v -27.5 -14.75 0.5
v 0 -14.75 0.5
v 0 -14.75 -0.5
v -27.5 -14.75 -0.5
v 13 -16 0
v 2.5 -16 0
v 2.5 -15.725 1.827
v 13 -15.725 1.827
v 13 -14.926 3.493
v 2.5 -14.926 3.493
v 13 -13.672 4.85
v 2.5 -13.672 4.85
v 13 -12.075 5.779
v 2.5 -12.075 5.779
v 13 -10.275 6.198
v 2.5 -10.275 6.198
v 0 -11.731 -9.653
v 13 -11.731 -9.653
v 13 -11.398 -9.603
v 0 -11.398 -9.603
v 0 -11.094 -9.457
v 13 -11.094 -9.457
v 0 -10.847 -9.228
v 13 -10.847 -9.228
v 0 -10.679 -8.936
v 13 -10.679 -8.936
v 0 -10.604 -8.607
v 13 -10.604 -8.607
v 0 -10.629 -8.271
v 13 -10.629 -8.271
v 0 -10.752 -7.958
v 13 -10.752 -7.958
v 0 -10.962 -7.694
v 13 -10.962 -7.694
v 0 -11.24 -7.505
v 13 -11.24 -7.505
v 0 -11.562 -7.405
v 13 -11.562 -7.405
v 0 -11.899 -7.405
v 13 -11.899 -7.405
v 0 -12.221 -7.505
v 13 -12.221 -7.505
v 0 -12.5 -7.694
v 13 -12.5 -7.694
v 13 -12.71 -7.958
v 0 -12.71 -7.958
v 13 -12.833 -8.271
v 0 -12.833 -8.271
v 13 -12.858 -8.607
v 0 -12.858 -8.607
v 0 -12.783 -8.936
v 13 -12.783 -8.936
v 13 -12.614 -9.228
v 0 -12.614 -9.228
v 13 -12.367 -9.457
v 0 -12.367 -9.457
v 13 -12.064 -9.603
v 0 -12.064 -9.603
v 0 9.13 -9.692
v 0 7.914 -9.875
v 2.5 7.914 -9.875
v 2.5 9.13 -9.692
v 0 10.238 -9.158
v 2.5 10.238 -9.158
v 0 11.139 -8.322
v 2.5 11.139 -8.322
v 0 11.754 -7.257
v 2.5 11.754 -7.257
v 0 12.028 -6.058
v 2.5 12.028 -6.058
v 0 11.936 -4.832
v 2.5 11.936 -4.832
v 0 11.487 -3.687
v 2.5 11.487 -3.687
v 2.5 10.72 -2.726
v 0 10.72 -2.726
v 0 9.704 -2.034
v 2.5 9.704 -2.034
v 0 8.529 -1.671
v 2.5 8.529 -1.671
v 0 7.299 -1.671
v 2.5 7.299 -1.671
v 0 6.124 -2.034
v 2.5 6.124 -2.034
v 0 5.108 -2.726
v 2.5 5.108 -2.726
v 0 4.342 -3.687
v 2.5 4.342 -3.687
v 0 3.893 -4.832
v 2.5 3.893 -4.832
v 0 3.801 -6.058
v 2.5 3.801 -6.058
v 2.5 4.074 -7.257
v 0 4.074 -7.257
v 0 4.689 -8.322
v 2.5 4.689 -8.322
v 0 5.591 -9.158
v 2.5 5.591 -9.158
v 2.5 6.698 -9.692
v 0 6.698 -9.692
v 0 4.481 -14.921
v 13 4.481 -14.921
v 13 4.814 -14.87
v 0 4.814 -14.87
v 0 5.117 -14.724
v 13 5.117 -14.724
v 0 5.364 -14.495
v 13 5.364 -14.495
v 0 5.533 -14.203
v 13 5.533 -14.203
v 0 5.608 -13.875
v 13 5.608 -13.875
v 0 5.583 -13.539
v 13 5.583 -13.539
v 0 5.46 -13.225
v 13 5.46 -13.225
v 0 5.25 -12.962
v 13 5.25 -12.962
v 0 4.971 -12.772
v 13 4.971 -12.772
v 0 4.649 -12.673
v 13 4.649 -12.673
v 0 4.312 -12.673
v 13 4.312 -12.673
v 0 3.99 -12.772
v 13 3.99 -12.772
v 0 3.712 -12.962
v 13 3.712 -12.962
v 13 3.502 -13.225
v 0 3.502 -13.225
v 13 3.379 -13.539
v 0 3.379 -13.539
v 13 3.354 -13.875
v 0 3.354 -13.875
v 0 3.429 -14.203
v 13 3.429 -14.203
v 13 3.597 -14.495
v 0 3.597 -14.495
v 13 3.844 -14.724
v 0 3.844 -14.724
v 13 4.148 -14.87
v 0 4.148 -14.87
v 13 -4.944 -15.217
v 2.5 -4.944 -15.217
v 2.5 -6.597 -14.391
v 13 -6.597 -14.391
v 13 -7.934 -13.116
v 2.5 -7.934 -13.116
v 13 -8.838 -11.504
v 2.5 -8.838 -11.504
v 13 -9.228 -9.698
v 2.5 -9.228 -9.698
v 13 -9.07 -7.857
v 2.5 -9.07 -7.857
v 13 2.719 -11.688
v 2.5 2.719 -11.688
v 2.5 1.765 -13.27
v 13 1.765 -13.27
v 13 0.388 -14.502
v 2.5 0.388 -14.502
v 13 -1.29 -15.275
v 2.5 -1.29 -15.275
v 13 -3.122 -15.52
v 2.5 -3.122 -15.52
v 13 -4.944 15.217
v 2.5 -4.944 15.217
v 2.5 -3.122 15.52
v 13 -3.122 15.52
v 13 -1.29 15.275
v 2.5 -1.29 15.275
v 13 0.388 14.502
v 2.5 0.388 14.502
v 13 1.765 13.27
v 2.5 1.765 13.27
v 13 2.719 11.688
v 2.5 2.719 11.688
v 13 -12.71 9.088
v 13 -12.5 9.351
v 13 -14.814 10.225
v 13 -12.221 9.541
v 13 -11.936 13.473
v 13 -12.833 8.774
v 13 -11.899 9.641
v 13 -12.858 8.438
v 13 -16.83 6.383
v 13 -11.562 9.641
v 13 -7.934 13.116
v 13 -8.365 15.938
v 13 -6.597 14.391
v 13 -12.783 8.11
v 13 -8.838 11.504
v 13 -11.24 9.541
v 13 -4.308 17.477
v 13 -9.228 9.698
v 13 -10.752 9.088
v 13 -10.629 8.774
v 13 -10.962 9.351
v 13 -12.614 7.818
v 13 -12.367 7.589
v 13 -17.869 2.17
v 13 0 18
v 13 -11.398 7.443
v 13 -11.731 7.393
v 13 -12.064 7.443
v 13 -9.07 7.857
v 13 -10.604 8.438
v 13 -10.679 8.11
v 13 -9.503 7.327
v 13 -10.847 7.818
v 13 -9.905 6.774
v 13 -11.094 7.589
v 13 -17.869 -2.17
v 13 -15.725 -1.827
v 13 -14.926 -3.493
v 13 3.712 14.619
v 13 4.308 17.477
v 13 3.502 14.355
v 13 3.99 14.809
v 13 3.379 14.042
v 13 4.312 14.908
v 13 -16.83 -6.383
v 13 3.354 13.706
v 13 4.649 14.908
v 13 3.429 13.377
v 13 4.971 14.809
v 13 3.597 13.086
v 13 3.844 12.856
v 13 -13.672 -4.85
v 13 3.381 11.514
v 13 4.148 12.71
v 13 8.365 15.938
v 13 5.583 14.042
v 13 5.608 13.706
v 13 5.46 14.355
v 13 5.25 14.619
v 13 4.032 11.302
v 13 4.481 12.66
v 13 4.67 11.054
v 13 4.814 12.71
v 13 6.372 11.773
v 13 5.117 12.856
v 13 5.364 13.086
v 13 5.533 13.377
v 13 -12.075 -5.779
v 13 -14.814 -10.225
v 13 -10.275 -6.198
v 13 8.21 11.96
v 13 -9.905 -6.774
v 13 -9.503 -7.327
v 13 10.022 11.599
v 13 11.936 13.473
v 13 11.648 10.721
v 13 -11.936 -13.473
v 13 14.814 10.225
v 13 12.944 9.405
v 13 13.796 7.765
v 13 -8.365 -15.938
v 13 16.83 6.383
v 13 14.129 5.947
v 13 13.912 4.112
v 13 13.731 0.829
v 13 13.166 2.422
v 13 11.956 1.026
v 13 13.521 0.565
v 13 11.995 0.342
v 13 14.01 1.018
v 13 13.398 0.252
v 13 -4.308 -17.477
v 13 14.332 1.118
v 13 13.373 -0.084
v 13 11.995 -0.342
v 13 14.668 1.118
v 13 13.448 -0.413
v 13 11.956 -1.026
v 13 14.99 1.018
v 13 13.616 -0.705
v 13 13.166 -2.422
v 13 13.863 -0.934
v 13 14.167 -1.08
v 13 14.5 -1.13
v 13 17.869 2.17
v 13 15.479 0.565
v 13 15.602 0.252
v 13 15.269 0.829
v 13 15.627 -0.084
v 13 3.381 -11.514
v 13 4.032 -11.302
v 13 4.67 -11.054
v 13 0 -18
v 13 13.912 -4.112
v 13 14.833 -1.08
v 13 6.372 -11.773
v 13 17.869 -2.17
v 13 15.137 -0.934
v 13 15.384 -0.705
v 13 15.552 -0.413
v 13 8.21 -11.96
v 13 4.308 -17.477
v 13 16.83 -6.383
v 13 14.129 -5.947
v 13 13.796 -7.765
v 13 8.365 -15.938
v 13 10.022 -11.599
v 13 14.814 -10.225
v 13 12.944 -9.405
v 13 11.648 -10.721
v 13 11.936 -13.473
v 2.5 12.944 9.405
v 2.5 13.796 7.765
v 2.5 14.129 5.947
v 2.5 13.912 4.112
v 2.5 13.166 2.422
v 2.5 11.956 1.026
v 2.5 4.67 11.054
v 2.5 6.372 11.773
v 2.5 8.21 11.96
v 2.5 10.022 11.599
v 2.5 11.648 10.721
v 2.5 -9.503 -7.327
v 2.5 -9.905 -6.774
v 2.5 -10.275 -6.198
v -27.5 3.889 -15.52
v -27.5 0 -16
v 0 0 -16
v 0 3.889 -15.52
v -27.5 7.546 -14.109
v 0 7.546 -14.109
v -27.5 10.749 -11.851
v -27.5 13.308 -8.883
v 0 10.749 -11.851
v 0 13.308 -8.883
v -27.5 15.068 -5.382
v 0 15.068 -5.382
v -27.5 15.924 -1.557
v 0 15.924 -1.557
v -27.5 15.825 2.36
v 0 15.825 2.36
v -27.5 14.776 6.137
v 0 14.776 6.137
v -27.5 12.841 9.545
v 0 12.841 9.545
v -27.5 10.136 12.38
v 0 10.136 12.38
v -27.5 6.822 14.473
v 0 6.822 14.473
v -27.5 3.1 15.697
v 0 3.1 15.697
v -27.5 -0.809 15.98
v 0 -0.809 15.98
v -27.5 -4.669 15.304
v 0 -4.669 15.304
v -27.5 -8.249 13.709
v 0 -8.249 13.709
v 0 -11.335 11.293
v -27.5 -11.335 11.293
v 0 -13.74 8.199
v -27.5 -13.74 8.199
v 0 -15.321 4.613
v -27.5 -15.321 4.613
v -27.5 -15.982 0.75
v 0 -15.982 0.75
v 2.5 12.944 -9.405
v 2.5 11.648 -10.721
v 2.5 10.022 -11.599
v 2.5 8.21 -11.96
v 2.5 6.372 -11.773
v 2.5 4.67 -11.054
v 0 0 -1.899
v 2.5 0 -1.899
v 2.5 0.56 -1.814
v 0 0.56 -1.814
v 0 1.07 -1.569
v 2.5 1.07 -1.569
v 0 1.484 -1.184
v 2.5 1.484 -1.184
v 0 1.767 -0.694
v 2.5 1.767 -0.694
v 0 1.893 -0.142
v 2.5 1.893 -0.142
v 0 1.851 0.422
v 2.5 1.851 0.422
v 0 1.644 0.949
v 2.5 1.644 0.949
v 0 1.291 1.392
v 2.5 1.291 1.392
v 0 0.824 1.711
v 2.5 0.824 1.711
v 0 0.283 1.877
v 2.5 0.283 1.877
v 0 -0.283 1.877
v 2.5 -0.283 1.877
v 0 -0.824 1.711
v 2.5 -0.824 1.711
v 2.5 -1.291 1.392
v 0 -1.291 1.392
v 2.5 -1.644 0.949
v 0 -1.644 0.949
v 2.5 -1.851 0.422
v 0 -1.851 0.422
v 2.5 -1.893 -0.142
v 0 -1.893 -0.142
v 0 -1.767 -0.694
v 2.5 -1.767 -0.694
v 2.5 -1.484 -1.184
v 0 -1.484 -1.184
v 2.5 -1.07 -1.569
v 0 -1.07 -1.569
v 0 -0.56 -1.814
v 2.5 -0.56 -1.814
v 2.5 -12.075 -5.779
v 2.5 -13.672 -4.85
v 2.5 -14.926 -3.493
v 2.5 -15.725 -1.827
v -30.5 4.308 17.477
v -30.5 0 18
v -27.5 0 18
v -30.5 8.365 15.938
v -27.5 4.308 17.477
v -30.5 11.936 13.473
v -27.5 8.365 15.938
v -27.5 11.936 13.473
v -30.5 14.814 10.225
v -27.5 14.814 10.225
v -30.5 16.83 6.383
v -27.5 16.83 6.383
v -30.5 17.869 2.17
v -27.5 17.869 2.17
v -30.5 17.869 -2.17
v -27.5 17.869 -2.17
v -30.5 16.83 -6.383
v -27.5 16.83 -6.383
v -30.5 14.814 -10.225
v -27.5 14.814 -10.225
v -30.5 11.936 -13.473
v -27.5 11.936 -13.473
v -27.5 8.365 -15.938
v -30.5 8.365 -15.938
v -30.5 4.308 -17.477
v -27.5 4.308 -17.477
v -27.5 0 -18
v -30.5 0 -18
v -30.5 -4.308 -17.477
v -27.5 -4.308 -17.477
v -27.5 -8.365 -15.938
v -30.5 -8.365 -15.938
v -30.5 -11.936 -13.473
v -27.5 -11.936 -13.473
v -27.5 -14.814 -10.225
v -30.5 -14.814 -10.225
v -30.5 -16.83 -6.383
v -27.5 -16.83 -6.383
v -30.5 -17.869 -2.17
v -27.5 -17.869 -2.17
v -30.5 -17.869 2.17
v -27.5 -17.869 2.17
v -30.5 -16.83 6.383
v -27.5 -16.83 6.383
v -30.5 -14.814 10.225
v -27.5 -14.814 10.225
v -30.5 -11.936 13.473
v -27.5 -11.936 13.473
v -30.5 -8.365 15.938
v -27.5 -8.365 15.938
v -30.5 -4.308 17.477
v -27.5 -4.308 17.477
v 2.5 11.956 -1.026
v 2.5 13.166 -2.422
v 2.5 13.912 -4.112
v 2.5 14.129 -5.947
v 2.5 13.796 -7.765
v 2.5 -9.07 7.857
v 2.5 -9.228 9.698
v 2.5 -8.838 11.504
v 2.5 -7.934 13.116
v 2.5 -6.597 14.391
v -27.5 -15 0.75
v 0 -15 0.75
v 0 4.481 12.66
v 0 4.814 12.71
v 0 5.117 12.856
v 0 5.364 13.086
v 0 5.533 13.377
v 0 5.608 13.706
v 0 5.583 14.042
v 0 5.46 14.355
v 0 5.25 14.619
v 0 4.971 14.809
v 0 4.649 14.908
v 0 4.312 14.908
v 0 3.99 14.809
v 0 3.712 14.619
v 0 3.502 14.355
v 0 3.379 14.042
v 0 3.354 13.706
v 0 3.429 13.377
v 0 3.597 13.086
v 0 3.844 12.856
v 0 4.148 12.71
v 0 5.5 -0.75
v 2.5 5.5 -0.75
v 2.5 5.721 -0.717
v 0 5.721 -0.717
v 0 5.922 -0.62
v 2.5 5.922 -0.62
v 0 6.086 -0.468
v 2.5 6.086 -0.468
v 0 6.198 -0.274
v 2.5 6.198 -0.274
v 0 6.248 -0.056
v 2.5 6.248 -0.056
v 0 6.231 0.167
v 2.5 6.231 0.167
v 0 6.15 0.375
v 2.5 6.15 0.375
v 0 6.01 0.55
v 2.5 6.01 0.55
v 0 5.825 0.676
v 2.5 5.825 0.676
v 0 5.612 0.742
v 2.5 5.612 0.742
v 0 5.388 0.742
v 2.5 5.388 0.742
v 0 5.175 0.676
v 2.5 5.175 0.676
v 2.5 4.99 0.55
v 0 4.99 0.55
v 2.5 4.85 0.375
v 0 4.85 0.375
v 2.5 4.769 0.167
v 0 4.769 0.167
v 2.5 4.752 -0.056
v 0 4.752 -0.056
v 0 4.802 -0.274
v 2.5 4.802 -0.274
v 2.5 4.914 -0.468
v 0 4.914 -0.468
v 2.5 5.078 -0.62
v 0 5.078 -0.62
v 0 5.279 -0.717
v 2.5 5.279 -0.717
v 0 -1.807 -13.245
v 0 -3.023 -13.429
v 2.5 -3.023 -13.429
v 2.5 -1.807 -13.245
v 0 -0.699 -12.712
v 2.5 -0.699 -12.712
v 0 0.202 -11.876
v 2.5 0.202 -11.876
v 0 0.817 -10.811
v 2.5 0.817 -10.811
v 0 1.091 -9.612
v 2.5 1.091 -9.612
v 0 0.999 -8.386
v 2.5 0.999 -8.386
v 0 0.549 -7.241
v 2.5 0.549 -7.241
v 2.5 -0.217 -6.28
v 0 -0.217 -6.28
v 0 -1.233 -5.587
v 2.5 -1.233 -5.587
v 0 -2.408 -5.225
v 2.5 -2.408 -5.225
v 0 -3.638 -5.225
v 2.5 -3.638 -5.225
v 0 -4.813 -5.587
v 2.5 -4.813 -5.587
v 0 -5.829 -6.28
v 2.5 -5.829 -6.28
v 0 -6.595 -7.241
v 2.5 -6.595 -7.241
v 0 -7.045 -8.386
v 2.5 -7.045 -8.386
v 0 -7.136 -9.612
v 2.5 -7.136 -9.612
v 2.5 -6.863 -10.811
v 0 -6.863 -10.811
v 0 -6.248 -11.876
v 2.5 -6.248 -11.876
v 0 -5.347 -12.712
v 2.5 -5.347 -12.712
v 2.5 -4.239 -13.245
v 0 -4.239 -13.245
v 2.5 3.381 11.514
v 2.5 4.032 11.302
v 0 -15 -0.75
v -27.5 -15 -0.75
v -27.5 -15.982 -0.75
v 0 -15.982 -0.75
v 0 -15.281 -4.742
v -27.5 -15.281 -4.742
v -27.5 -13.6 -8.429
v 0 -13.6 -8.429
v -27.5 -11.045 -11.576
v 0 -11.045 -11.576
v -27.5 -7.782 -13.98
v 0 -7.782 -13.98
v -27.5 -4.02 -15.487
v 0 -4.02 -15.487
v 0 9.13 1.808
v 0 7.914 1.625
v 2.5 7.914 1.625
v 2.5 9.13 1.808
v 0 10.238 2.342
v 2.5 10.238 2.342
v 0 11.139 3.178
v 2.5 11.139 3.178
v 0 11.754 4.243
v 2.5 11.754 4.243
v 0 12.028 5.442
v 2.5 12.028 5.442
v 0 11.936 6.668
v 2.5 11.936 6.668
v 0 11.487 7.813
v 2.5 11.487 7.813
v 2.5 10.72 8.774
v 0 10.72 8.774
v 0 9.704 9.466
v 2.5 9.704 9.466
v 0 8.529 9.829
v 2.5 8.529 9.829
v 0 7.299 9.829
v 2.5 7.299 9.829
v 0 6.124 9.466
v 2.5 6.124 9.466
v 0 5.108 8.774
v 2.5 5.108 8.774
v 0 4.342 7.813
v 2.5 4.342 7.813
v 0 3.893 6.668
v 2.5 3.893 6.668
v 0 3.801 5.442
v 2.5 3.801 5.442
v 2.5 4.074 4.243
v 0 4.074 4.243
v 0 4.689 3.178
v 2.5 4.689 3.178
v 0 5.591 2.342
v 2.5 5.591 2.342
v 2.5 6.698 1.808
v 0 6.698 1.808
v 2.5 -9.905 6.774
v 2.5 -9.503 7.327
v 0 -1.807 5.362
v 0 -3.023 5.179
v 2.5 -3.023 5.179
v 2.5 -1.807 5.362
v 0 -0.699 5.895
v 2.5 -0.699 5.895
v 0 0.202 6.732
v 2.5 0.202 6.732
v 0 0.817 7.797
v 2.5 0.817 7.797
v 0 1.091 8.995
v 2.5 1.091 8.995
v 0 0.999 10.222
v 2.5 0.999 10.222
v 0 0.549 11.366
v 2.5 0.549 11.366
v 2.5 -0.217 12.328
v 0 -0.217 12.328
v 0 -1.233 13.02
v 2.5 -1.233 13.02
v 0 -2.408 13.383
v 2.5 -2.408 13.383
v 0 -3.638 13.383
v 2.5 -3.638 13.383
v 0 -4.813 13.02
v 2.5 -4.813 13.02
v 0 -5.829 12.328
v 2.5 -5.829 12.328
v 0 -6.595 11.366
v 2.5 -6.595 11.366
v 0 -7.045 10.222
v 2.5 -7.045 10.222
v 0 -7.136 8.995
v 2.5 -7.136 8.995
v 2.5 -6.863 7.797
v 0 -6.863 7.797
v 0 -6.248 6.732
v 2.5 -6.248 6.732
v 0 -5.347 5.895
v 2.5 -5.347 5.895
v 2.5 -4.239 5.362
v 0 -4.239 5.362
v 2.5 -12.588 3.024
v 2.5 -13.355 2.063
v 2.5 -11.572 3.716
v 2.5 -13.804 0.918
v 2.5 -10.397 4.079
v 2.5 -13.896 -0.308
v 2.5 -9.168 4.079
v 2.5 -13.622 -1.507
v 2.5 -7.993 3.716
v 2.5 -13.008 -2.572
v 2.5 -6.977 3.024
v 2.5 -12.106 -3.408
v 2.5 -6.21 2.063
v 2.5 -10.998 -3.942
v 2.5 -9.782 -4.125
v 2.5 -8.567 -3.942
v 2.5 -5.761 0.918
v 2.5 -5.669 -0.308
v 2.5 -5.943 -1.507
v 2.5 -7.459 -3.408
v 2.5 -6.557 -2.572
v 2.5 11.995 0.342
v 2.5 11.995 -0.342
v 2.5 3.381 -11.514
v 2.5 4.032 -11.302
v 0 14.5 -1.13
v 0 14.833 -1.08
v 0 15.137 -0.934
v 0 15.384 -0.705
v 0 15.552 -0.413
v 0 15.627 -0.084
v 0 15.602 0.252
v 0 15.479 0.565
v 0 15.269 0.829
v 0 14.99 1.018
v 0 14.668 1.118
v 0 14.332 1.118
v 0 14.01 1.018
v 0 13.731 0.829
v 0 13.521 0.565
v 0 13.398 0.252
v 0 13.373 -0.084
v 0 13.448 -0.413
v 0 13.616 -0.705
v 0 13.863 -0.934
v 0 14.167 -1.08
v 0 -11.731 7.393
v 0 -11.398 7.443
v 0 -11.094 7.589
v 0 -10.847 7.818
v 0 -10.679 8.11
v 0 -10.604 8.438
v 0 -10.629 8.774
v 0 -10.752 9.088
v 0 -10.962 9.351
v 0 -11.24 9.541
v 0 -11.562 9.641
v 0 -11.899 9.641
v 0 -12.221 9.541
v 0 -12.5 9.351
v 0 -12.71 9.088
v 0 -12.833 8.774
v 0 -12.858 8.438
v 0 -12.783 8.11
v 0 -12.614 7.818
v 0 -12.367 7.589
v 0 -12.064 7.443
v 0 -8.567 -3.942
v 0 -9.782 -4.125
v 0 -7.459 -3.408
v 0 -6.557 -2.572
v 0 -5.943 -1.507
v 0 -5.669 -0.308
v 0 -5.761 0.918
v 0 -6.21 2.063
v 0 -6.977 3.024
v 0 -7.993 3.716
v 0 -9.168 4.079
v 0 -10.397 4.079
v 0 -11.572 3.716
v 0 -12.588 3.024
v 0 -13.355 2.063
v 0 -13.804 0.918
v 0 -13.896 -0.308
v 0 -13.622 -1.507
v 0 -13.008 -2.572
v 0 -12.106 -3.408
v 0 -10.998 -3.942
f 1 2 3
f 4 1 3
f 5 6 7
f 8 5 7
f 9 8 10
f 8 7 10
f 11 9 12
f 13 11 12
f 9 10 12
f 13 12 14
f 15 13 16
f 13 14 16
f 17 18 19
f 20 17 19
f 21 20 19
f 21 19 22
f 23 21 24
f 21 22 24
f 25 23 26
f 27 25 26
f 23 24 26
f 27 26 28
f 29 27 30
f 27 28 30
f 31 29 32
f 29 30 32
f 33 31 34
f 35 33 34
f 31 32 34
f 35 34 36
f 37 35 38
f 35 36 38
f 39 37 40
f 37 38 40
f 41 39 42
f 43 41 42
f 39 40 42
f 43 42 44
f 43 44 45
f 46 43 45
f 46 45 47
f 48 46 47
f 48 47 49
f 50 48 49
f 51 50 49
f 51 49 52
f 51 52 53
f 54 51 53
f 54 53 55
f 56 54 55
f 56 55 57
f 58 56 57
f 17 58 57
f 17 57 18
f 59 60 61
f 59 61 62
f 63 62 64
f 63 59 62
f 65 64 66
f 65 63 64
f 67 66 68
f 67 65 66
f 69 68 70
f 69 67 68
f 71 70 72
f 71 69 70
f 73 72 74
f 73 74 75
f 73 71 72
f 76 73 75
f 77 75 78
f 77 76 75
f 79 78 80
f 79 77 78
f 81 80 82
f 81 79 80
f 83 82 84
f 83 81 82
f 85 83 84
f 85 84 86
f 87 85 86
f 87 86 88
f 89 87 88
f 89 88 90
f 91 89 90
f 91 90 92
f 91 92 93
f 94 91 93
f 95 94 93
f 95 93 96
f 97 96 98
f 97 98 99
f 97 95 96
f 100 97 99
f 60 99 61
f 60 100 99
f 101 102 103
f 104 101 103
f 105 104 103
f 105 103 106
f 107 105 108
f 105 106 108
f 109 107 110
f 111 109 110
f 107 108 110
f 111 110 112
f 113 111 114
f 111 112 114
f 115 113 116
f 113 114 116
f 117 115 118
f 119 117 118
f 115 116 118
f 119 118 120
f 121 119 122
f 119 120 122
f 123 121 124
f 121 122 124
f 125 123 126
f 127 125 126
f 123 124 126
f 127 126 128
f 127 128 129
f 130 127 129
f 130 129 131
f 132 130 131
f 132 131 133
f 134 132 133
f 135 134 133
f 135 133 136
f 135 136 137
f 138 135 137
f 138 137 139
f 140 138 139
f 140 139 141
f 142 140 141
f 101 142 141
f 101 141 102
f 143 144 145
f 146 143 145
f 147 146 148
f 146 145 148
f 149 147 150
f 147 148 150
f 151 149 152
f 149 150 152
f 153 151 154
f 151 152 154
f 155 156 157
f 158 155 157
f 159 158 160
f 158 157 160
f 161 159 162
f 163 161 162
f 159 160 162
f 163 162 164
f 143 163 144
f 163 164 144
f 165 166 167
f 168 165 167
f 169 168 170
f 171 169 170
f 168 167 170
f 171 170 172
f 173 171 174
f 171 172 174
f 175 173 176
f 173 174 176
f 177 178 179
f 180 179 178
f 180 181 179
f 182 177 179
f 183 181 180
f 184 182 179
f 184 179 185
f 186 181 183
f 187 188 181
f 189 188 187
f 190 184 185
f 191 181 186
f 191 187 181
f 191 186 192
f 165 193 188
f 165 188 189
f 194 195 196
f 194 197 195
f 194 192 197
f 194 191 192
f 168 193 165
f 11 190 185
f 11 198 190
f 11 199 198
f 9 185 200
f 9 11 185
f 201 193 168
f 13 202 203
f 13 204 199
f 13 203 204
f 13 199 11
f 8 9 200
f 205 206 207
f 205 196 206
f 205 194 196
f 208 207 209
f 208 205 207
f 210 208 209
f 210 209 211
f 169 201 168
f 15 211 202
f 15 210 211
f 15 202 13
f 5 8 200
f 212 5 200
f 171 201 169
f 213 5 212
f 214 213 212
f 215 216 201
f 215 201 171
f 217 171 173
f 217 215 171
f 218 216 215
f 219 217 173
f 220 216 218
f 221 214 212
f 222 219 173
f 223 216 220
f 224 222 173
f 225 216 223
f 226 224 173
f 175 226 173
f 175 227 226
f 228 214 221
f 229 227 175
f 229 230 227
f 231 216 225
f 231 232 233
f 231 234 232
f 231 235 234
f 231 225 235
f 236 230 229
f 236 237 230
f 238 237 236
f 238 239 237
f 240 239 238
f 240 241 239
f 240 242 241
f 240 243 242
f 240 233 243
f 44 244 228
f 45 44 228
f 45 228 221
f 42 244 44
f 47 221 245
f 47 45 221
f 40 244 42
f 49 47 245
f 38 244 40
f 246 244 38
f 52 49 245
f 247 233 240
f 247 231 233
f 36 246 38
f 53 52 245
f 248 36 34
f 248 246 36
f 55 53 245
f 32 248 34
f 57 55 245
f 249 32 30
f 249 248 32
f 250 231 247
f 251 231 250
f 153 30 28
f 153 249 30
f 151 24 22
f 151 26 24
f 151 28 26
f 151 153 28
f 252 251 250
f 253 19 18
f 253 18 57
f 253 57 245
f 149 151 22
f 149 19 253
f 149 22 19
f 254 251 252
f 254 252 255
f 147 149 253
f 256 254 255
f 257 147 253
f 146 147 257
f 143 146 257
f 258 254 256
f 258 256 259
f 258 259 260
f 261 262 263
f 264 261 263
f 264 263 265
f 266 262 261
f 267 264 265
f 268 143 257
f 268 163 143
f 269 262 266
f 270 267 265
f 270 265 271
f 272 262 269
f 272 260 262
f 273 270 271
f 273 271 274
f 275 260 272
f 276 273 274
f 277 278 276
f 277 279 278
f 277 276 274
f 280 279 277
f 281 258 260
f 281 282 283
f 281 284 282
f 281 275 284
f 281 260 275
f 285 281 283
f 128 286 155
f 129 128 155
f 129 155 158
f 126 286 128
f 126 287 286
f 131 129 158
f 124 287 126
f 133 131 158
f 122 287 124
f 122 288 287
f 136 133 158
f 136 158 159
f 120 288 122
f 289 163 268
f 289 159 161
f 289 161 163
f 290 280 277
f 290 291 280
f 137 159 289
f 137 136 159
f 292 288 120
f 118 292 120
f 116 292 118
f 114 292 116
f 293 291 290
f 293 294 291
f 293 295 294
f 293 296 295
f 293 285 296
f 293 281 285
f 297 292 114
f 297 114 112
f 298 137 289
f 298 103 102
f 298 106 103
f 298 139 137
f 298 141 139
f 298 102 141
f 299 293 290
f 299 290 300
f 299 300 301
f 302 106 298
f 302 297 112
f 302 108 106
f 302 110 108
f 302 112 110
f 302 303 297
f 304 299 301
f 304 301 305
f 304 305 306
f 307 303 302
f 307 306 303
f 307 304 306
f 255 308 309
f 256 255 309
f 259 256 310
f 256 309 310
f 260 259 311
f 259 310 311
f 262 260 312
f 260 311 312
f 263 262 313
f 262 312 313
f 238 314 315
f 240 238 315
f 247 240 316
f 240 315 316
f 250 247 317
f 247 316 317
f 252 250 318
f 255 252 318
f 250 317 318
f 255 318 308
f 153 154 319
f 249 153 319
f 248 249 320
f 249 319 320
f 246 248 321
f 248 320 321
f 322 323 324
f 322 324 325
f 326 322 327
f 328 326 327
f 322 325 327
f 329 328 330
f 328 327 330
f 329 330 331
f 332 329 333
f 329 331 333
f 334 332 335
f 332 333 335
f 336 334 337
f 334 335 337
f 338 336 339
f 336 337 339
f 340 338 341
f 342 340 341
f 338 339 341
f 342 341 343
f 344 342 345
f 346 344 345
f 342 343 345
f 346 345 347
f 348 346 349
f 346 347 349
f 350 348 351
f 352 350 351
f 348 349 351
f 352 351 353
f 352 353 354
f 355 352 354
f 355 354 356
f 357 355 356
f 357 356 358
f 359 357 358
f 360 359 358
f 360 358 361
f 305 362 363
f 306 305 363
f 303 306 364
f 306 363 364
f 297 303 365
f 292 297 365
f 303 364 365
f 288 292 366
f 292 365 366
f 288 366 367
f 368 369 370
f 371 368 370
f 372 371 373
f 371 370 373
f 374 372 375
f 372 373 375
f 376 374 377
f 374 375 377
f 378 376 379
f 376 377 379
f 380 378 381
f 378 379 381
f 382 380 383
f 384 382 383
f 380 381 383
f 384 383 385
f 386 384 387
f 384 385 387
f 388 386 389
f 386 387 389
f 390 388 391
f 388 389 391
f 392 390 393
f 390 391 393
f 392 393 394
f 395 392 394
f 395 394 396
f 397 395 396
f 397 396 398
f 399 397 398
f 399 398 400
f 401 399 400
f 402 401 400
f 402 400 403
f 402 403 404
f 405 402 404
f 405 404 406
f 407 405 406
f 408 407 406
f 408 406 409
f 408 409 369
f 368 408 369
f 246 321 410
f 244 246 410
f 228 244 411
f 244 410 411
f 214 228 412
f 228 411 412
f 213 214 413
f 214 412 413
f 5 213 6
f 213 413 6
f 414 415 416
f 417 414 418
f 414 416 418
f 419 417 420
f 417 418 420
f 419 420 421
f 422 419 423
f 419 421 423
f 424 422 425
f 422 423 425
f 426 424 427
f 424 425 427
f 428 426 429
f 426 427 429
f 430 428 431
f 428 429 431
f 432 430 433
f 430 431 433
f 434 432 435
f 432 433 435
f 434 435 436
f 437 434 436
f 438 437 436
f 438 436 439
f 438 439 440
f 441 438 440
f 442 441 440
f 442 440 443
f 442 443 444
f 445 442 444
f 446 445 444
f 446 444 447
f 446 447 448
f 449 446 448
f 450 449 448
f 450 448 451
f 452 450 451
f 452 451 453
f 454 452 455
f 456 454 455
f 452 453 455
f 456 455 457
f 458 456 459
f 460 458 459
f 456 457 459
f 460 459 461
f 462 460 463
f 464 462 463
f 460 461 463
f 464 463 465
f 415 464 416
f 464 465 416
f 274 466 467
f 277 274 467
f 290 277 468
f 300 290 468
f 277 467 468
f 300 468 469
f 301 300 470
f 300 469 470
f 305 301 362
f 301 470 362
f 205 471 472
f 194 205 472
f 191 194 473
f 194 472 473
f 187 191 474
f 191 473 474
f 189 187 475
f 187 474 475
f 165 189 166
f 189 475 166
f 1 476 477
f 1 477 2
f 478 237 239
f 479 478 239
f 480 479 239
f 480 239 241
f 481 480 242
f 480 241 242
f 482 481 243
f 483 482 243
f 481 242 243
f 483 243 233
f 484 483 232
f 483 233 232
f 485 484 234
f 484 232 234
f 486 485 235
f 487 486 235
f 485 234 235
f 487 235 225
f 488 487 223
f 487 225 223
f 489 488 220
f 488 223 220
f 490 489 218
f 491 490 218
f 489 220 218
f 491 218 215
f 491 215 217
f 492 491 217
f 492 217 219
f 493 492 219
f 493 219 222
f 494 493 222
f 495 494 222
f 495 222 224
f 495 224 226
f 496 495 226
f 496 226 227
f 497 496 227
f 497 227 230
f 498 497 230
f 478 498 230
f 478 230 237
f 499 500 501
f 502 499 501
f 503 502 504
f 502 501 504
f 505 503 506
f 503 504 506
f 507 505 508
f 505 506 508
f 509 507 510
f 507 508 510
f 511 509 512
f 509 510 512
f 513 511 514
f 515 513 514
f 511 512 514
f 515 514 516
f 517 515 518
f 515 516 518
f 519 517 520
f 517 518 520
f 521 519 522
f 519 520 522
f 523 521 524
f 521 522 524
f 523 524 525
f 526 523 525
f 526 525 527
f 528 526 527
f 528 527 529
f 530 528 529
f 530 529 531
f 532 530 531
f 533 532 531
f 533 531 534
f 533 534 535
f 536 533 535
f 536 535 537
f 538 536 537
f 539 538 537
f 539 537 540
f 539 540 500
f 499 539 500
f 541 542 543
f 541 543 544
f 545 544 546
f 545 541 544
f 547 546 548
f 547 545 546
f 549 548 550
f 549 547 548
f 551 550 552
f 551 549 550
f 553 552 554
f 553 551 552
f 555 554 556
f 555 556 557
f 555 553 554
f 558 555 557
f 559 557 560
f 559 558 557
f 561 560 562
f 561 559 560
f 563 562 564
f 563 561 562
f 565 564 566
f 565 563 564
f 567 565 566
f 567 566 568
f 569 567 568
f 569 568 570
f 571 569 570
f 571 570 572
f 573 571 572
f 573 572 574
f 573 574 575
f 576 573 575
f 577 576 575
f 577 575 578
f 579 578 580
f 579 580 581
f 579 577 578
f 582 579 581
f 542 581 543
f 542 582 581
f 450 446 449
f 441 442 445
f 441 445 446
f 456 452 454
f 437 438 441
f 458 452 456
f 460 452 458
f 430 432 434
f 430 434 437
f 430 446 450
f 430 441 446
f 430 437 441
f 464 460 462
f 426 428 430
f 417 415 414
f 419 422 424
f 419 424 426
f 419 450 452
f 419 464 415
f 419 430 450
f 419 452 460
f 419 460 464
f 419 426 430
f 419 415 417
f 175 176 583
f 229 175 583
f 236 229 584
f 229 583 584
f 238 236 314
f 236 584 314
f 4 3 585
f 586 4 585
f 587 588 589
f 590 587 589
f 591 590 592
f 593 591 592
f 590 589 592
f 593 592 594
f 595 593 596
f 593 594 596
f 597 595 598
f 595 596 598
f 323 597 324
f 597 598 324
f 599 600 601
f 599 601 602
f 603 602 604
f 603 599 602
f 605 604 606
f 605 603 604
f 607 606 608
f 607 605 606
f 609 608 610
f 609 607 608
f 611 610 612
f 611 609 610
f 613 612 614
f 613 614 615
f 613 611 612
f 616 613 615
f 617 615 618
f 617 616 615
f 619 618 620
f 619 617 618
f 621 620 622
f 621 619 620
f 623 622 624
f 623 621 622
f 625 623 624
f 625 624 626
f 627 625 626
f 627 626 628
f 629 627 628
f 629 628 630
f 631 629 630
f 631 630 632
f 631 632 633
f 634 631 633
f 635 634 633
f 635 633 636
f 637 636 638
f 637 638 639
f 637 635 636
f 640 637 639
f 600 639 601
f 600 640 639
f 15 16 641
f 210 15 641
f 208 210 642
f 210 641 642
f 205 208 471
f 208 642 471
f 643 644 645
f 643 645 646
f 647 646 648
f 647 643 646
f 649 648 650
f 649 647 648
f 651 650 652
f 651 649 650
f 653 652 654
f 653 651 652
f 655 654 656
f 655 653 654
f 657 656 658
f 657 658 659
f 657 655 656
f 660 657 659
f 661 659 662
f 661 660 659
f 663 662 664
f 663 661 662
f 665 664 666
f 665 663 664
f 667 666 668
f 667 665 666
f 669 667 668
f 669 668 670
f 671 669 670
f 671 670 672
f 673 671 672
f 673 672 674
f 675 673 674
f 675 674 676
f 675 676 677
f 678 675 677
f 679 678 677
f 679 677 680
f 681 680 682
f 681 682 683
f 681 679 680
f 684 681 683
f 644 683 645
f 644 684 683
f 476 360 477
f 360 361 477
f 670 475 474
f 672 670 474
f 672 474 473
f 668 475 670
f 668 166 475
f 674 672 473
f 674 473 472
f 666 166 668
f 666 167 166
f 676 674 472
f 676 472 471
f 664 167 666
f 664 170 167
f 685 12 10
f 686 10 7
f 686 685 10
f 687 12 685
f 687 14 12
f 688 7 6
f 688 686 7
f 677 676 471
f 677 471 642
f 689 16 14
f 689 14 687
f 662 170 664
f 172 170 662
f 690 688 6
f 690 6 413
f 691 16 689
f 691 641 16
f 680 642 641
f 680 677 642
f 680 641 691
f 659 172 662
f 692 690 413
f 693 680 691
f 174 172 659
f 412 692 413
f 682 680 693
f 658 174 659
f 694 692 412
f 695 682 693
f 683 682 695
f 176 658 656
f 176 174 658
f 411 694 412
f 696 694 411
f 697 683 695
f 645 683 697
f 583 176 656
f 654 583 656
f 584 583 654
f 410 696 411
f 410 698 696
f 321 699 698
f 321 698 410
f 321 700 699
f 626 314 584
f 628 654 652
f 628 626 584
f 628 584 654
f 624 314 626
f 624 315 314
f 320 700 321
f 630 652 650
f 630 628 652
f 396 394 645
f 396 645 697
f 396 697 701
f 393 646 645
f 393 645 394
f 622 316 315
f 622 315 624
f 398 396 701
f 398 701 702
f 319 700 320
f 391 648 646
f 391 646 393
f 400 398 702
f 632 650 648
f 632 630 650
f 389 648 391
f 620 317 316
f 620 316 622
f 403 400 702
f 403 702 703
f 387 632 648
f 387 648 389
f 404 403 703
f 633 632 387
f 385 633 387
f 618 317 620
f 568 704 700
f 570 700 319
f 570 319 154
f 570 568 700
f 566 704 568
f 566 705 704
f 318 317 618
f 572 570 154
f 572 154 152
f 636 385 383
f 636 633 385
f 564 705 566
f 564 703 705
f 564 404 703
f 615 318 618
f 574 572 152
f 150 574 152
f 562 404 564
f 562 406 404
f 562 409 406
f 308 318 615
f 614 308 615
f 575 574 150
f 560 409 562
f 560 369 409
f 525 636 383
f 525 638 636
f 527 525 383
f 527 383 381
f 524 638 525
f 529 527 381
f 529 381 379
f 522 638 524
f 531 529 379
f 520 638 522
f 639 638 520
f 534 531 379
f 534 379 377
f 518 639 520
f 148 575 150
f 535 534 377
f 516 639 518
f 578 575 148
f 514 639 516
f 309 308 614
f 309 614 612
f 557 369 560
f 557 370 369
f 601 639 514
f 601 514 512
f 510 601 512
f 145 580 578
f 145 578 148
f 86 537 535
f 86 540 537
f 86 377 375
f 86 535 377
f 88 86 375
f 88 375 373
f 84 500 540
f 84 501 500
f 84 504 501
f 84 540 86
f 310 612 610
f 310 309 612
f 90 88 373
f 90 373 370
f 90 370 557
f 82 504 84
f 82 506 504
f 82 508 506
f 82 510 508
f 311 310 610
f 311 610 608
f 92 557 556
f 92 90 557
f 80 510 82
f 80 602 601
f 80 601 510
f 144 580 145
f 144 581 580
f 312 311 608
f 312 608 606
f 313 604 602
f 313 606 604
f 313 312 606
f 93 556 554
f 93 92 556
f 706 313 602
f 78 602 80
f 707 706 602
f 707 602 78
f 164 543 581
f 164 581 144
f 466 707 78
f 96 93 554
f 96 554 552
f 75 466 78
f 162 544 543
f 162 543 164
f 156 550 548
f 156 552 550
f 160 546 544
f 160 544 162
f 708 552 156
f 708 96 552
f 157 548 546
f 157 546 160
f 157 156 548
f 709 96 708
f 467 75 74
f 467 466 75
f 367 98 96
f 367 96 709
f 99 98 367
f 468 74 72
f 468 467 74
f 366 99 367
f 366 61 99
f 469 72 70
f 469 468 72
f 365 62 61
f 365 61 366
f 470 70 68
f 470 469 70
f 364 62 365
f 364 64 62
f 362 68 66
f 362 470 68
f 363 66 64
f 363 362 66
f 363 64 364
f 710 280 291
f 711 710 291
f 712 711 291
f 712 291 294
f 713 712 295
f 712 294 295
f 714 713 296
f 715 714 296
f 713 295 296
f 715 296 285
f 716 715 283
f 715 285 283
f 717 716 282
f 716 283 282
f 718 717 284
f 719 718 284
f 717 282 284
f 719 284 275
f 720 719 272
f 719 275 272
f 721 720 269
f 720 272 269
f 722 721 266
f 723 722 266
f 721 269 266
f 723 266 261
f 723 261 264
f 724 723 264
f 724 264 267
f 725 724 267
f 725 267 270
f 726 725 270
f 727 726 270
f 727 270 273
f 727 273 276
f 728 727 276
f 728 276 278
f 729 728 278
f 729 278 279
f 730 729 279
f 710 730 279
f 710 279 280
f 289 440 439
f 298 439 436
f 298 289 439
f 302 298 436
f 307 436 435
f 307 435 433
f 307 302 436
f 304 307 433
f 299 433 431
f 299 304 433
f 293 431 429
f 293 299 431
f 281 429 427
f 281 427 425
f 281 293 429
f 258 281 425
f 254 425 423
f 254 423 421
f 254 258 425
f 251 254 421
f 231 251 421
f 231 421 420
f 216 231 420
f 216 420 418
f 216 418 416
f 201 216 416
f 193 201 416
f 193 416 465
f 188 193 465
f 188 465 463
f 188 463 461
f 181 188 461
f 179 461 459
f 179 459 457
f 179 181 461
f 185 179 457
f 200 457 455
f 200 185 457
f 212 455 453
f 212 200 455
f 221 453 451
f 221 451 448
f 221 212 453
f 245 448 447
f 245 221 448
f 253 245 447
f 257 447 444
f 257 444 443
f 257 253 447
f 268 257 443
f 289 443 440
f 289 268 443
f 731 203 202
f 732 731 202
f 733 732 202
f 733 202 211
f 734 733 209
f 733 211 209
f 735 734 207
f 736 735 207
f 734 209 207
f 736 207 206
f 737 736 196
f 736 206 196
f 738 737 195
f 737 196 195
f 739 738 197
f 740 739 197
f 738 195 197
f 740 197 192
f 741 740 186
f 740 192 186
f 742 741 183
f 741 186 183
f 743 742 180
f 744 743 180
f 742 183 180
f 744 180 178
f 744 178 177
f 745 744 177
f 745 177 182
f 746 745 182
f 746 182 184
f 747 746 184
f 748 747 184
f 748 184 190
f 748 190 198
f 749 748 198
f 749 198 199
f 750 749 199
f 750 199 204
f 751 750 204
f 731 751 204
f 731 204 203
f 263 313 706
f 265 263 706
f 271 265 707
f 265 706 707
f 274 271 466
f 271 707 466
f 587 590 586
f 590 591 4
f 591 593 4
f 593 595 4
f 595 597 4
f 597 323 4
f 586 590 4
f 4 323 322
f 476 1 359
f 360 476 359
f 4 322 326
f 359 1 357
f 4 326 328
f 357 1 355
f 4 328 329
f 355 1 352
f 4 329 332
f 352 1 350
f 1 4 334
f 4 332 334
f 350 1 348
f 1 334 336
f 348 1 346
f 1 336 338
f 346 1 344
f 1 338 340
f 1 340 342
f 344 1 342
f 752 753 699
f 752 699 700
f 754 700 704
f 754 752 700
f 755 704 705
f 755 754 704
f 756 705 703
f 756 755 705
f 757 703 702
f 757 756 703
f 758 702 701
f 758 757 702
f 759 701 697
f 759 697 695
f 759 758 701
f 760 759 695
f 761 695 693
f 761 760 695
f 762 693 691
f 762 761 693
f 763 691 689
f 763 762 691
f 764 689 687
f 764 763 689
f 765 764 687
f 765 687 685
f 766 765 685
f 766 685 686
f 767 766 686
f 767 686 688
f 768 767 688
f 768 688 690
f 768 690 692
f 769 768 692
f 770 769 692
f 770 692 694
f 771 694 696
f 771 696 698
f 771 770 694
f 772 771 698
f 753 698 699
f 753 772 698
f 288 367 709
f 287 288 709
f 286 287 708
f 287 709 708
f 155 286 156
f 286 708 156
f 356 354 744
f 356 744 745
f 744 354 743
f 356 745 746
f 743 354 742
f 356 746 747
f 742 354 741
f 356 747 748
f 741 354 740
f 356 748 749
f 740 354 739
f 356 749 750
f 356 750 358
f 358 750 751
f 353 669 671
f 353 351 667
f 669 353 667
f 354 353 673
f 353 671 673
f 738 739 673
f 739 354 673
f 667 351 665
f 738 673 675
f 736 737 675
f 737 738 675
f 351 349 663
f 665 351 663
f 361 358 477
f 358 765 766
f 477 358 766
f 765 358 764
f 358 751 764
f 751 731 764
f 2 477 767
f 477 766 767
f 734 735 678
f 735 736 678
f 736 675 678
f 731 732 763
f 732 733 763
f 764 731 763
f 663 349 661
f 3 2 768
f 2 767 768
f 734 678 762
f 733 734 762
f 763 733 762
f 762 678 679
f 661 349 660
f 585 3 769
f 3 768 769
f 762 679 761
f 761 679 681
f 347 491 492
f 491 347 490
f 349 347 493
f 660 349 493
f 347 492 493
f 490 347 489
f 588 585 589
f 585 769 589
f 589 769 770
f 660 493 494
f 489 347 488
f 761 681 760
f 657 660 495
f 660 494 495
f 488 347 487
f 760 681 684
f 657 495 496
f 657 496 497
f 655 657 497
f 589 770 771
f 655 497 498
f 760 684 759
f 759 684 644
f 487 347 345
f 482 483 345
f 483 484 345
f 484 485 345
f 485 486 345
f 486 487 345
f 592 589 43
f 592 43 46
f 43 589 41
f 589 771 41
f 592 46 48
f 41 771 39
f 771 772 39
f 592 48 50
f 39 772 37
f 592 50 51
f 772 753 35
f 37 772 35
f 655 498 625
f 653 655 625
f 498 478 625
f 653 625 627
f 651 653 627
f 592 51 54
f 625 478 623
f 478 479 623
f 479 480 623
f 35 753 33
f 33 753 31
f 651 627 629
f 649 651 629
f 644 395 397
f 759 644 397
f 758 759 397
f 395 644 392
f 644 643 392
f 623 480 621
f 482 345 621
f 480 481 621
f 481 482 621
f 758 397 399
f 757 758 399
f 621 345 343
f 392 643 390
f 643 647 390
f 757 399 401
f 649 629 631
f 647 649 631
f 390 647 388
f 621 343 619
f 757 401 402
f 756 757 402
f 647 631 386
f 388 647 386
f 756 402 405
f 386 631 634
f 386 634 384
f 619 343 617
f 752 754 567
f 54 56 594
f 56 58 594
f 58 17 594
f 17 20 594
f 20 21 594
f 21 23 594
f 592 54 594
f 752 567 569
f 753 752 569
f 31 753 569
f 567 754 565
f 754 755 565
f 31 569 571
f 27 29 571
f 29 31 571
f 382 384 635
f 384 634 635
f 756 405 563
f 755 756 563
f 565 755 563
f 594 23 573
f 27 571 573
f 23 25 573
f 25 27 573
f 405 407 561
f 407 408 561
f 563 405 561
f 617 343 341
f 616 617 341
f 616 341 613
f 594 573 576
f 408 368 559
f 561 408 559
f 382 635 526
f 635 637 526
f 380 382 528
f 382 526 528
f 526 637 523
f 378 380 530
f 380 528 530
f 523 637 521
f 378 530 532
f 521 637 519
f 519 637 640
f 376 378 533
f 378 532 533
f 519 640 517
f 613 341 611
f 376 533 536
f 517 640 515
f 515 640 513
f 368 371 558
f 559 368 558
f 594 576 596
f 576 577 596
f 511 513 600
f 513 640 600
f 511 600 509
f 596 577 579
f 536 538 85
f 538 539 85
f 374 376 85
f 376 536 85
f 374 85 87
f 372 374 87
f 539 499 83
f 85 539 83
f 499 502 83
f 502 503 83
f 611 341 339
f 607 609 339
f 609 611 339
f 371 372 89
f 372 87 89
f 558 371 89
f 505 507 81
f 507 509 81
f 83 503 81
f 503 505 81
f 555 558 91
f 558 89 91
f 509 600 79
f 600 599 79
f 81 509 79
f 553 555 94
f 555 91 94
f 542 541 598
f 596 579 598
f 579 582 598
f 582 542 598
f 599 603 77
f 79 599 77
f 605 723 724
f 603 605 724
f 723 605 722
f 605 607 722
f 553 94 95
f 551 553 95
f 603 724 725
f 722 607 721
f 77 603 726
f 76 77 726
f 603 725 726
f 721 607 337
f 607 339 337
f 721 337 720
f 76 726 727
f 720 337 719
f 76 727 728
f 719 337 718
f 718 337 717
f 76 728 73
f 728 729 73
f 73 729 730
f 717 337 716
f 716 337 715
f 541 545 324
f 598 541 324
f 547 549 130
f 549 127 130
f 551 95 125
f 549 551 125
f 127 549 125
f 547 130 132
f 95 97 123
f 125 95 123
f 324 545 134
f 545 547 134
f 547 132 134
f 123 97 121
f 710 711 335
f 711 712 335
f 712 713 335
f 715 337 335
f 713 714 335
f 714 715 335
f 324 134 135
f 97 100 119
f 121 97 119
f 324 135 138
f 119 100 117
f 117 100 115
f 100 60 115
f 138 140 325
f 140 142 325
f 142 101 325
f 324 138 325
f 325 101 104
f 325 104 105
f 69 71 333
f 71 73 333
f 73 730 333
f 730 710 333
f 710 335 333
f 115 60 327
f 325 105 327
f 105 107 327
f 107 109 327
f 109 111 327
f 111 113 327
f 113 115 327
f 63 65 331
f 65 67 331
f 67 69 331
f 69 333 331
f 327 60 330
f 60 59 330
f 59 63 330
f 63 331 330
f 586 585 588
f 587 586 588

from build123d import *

# Parameters (mm, degrees)
SKETCH1_R                = 16
SKETCH1_R_2              = 4.125
BOSS_EXTRUDE1_DEPTH      = 2.5
SKETCH2_R                = 18
SKETCH2_R_2              = 16
BOSS_EXTRUDE2_DEPTH      = 10.5
BOSS_EXTRUDE2_DEPTH_BACK = 30
SKETCH3_R                = 18
BOSS_EXTRUDE3_DEPTH      = 3
SKETCH4_R                = 1.89865
CUT_EXTRUDE1_DEPTH       = 3
BOSS_EXTRUDE4_DEPTH      = 31
SKETCH6_R                = 0.75
CUT_EXTRUDE2_DEPTH       = 3
BOSS_EXTRUDE5_DEPTH      = 10.5
SKETCH8_R                = 1.1303
CUT_EXTRUDE3_DEPTH       = 23


with BuildPart() as part:
    # Sketch1 → Boss-Extrude1 (new body)
    with BuildSketch(Plane(origin=(0, 0, 0), x_dir=(0, 0, -1), z_dir=(1, 0, 0))):
        Circle(SKETCH1_R)
        with Locations((-5.75, 7.914196043)):
            Circle(SKETCH1_R_2, mode=Mode.SUBTRACT)
        with Locations((5.75, 7.914196043)):
            Circle(SKETCH1_R_2, mode=Mode.SUBTRACT)
        with Locations((9.303695435, -3.022953895)):
            Circle(SKETCH1_R_2, mode=Mode.SUBTRACT)
        with Locations((0, -9.782484296)):
            Circle(SKETCH1_R_2, mode=Mode.SUBTRACT)
        with Locations((-9.303695435, -3.022953895)):
            Circle(SKETCH1_R_2, mode=Mode.SUBTRACT)
    extrude(amount=BOSS_EXTRUDE1_DEPTH)

    # Sketch2 → Boss-Extrude2 (add, two sides)
    with BuildSketch(Plane(origin=(2.5, 0, 0), x_dir=(0, 0, -1), z_dir=(1, 0, 0))) as boss_extrude2_sk:
        Circle(SKETCH2_R)
        Circle(SKETCH2_R_2, mode=Mode.SUBTRACT)
    extrude(amount=BOSS_EXTRUDE2_DEPTH)
    extrude(boss_extrude2_sk.sketch, amount=-BOSS_EXTRUDE2_DEPTH_BACK)

    # Sketch3 → Boss-Extrude3 (add)
    with BuildSketch(Plane.ZY.offset(27.5)):
        Circle(SKETCH3_R)
    extrude(amount=BOSS_EXTRUDE3_DEPTH)

    # Sketch4 → Cut-Extrude1 (cut)
    with BuildSketch(Plane(origin=(2.5, 0, 0), x_dir=(0, 0, -1), z_dir=(1, 0, 0))):
        Circle(SKETCH4_R)
    extrude(amount=-CUT_EXTRUDE1_DEPTH, mode=Mode.SUBTRACT)

    # Sketch5 → Boss-Extrude4 (add)
    with BuildSketch(Plane(origin=(2.5, 0, 0), x_dir=(0, 0, -1), z_dir=(1, 0, 0))):
        Polygon((-0.75, -15), (-0.5, -14.75), (0.5, -14.75), (0.75, -15), (0.75, -16.25), (-0.75, -16.25), align=None)
    extrude(amount=-BOSS_EXTRUDE4_DEPTH)

    # Sketch6 → Cut-Extrude2 (cut)
    with BuildSketch(Plane(origin=(2.5, 0, 0), x_dir=(0, 0, -1), z_dir=(1, 0, 0))):
        with Locations((0, 5.5)):
            Circle(SKETCH6_R)
    extrude(amount=-CUT_EXTRUDE2_DEPTH, mode=Mode.SUBTRACT)

    # Sketch7 → Boss-Extrude5 (add)
    with BuildSketch(Plane(origin=(2.5, 0, 0), x_dir=(0, 0, -1), z_dir=(1, 0, 0))):
        with BuildLine():
            ThreePointArc((-9.404564054, 12.944271897), (-5.021788452, 14.088919475), (-1.025538841, 11.956097611))
            ThreePointArc((-1.025538841, 11.956097611), (0, 12), (1.025538841, 11.956097611))
            ThreePointArc((1.025538841, 11.956097611), (5.021788614, 14.088919494), (9.404564318, 12.944271706))
            ThreePointArc((9.404564318, 12.944271706), (1.63e-07, 16), (-9.404564054, 12.944271897))
        make_face()
        with BuildLine():
            ThreePointArc((-11.054015612, 4.669982746), (-11.847540705, 9.12972016), (-9.404564054, 12.944271897))
            ThreePointArc((-9.404564054, 12.944271897), (-15.216904236, 4.944271986), (-15.216904316, -4.944271739))
            ThreePointArc((-15.216904316, -4.944271739), (-14.951176606, -0.422288989), (-11.687833473, 2.719291951))
            ThreePointArc((-11.687833473, 2.719291951), (-11.412678196, 3.708203932), (-11.054015612, 4.669982746))
        make_face()
        with BuildLine():
            ThreePointArc((-7.857296202, -9.069889547), (-12.343971357, -8.446442057), (-15.216904316, -4.944271739))
            ThreePointArc((-15.216904316, -4.944271739), (-9.40456411, -12.944271857), (0, -16))
            ThreePointArc((0, -16), (-4.218546896, -14.349908473), (-6.1979395, -10.27548276))
            ThreePointArc((-6.1979395, -10.27548276), (-7.053423028, -9.708203932), (-7.857296202, -9.069889547))
        make_face()
        with BuildLine():
            ThreePointArc((6.1979395, -10.27548276), (4.218546896, -14.349908473), (0, -16))
            ThreePointArc((0, -16), (9.404563995, -12.944271941), (15.216904229, -4.944272009))
            ThreePointArc((15.216904229, -4.944272009), (12.343971234, -8.446442126), (7.857296202, -9.069889547))
            ThreePointArc((7.857296202, -9.069889547), (7.053423028, -9.708203932), (6.1979395, -10.27548276))
        make_face()
        with BuildLine():
            ThreePointArc((16, 0), (14.256104466, 7.263847841), (9.404564318, 12.944271706))
            ThreePointArc((9.404564318, 12.944271706), (11.847540737, 9.12972), (11.054015612, 4.669982746))
            ThreePointArc((11.054015612, 4.669982746), (11.412678196, 3.708203932), (11.687833473, 2.719291951))
            ThreePointArc((11.687833473, 2.719291951), (14.951176666, -0.422289118), (15.216904229, -4.944272009))
            ThreePointArc((15.216904229, -4.944272009), (15.803013441, -2.502951492), (16, 0))
        make_face()
    extrude(amount=BOSS_EXTRUDE5_DEPTH)

    # Sketch8 → Cut-Extrude3 (cut)
    with BuildSketch(Plane(origin=(13, 0, 0), x_dir=(0, 0, -1), z_dir=(1, 0, 0))):
        with Locations((0, 14.5)):
            Circle(SKETCH8_R)
        with Locations((13.790319486, 4.480746418)):
            Circle(SKETCH8_R)
        with Locations((8.522886158, -11.730746418)):
            Circle(SKETCH8_R)
        with Locations((-8.522886158, -11.730746418)):
            Circle(SKETCH8_R)
        with Locations((-13.790319486, 4.480746418)):
            Circle(SKETCH8_R)
    extrude(amount=-CUT_EXTRUDE3_DEPTH, mode=Mode.SUBTRACT)


solid = part.part
